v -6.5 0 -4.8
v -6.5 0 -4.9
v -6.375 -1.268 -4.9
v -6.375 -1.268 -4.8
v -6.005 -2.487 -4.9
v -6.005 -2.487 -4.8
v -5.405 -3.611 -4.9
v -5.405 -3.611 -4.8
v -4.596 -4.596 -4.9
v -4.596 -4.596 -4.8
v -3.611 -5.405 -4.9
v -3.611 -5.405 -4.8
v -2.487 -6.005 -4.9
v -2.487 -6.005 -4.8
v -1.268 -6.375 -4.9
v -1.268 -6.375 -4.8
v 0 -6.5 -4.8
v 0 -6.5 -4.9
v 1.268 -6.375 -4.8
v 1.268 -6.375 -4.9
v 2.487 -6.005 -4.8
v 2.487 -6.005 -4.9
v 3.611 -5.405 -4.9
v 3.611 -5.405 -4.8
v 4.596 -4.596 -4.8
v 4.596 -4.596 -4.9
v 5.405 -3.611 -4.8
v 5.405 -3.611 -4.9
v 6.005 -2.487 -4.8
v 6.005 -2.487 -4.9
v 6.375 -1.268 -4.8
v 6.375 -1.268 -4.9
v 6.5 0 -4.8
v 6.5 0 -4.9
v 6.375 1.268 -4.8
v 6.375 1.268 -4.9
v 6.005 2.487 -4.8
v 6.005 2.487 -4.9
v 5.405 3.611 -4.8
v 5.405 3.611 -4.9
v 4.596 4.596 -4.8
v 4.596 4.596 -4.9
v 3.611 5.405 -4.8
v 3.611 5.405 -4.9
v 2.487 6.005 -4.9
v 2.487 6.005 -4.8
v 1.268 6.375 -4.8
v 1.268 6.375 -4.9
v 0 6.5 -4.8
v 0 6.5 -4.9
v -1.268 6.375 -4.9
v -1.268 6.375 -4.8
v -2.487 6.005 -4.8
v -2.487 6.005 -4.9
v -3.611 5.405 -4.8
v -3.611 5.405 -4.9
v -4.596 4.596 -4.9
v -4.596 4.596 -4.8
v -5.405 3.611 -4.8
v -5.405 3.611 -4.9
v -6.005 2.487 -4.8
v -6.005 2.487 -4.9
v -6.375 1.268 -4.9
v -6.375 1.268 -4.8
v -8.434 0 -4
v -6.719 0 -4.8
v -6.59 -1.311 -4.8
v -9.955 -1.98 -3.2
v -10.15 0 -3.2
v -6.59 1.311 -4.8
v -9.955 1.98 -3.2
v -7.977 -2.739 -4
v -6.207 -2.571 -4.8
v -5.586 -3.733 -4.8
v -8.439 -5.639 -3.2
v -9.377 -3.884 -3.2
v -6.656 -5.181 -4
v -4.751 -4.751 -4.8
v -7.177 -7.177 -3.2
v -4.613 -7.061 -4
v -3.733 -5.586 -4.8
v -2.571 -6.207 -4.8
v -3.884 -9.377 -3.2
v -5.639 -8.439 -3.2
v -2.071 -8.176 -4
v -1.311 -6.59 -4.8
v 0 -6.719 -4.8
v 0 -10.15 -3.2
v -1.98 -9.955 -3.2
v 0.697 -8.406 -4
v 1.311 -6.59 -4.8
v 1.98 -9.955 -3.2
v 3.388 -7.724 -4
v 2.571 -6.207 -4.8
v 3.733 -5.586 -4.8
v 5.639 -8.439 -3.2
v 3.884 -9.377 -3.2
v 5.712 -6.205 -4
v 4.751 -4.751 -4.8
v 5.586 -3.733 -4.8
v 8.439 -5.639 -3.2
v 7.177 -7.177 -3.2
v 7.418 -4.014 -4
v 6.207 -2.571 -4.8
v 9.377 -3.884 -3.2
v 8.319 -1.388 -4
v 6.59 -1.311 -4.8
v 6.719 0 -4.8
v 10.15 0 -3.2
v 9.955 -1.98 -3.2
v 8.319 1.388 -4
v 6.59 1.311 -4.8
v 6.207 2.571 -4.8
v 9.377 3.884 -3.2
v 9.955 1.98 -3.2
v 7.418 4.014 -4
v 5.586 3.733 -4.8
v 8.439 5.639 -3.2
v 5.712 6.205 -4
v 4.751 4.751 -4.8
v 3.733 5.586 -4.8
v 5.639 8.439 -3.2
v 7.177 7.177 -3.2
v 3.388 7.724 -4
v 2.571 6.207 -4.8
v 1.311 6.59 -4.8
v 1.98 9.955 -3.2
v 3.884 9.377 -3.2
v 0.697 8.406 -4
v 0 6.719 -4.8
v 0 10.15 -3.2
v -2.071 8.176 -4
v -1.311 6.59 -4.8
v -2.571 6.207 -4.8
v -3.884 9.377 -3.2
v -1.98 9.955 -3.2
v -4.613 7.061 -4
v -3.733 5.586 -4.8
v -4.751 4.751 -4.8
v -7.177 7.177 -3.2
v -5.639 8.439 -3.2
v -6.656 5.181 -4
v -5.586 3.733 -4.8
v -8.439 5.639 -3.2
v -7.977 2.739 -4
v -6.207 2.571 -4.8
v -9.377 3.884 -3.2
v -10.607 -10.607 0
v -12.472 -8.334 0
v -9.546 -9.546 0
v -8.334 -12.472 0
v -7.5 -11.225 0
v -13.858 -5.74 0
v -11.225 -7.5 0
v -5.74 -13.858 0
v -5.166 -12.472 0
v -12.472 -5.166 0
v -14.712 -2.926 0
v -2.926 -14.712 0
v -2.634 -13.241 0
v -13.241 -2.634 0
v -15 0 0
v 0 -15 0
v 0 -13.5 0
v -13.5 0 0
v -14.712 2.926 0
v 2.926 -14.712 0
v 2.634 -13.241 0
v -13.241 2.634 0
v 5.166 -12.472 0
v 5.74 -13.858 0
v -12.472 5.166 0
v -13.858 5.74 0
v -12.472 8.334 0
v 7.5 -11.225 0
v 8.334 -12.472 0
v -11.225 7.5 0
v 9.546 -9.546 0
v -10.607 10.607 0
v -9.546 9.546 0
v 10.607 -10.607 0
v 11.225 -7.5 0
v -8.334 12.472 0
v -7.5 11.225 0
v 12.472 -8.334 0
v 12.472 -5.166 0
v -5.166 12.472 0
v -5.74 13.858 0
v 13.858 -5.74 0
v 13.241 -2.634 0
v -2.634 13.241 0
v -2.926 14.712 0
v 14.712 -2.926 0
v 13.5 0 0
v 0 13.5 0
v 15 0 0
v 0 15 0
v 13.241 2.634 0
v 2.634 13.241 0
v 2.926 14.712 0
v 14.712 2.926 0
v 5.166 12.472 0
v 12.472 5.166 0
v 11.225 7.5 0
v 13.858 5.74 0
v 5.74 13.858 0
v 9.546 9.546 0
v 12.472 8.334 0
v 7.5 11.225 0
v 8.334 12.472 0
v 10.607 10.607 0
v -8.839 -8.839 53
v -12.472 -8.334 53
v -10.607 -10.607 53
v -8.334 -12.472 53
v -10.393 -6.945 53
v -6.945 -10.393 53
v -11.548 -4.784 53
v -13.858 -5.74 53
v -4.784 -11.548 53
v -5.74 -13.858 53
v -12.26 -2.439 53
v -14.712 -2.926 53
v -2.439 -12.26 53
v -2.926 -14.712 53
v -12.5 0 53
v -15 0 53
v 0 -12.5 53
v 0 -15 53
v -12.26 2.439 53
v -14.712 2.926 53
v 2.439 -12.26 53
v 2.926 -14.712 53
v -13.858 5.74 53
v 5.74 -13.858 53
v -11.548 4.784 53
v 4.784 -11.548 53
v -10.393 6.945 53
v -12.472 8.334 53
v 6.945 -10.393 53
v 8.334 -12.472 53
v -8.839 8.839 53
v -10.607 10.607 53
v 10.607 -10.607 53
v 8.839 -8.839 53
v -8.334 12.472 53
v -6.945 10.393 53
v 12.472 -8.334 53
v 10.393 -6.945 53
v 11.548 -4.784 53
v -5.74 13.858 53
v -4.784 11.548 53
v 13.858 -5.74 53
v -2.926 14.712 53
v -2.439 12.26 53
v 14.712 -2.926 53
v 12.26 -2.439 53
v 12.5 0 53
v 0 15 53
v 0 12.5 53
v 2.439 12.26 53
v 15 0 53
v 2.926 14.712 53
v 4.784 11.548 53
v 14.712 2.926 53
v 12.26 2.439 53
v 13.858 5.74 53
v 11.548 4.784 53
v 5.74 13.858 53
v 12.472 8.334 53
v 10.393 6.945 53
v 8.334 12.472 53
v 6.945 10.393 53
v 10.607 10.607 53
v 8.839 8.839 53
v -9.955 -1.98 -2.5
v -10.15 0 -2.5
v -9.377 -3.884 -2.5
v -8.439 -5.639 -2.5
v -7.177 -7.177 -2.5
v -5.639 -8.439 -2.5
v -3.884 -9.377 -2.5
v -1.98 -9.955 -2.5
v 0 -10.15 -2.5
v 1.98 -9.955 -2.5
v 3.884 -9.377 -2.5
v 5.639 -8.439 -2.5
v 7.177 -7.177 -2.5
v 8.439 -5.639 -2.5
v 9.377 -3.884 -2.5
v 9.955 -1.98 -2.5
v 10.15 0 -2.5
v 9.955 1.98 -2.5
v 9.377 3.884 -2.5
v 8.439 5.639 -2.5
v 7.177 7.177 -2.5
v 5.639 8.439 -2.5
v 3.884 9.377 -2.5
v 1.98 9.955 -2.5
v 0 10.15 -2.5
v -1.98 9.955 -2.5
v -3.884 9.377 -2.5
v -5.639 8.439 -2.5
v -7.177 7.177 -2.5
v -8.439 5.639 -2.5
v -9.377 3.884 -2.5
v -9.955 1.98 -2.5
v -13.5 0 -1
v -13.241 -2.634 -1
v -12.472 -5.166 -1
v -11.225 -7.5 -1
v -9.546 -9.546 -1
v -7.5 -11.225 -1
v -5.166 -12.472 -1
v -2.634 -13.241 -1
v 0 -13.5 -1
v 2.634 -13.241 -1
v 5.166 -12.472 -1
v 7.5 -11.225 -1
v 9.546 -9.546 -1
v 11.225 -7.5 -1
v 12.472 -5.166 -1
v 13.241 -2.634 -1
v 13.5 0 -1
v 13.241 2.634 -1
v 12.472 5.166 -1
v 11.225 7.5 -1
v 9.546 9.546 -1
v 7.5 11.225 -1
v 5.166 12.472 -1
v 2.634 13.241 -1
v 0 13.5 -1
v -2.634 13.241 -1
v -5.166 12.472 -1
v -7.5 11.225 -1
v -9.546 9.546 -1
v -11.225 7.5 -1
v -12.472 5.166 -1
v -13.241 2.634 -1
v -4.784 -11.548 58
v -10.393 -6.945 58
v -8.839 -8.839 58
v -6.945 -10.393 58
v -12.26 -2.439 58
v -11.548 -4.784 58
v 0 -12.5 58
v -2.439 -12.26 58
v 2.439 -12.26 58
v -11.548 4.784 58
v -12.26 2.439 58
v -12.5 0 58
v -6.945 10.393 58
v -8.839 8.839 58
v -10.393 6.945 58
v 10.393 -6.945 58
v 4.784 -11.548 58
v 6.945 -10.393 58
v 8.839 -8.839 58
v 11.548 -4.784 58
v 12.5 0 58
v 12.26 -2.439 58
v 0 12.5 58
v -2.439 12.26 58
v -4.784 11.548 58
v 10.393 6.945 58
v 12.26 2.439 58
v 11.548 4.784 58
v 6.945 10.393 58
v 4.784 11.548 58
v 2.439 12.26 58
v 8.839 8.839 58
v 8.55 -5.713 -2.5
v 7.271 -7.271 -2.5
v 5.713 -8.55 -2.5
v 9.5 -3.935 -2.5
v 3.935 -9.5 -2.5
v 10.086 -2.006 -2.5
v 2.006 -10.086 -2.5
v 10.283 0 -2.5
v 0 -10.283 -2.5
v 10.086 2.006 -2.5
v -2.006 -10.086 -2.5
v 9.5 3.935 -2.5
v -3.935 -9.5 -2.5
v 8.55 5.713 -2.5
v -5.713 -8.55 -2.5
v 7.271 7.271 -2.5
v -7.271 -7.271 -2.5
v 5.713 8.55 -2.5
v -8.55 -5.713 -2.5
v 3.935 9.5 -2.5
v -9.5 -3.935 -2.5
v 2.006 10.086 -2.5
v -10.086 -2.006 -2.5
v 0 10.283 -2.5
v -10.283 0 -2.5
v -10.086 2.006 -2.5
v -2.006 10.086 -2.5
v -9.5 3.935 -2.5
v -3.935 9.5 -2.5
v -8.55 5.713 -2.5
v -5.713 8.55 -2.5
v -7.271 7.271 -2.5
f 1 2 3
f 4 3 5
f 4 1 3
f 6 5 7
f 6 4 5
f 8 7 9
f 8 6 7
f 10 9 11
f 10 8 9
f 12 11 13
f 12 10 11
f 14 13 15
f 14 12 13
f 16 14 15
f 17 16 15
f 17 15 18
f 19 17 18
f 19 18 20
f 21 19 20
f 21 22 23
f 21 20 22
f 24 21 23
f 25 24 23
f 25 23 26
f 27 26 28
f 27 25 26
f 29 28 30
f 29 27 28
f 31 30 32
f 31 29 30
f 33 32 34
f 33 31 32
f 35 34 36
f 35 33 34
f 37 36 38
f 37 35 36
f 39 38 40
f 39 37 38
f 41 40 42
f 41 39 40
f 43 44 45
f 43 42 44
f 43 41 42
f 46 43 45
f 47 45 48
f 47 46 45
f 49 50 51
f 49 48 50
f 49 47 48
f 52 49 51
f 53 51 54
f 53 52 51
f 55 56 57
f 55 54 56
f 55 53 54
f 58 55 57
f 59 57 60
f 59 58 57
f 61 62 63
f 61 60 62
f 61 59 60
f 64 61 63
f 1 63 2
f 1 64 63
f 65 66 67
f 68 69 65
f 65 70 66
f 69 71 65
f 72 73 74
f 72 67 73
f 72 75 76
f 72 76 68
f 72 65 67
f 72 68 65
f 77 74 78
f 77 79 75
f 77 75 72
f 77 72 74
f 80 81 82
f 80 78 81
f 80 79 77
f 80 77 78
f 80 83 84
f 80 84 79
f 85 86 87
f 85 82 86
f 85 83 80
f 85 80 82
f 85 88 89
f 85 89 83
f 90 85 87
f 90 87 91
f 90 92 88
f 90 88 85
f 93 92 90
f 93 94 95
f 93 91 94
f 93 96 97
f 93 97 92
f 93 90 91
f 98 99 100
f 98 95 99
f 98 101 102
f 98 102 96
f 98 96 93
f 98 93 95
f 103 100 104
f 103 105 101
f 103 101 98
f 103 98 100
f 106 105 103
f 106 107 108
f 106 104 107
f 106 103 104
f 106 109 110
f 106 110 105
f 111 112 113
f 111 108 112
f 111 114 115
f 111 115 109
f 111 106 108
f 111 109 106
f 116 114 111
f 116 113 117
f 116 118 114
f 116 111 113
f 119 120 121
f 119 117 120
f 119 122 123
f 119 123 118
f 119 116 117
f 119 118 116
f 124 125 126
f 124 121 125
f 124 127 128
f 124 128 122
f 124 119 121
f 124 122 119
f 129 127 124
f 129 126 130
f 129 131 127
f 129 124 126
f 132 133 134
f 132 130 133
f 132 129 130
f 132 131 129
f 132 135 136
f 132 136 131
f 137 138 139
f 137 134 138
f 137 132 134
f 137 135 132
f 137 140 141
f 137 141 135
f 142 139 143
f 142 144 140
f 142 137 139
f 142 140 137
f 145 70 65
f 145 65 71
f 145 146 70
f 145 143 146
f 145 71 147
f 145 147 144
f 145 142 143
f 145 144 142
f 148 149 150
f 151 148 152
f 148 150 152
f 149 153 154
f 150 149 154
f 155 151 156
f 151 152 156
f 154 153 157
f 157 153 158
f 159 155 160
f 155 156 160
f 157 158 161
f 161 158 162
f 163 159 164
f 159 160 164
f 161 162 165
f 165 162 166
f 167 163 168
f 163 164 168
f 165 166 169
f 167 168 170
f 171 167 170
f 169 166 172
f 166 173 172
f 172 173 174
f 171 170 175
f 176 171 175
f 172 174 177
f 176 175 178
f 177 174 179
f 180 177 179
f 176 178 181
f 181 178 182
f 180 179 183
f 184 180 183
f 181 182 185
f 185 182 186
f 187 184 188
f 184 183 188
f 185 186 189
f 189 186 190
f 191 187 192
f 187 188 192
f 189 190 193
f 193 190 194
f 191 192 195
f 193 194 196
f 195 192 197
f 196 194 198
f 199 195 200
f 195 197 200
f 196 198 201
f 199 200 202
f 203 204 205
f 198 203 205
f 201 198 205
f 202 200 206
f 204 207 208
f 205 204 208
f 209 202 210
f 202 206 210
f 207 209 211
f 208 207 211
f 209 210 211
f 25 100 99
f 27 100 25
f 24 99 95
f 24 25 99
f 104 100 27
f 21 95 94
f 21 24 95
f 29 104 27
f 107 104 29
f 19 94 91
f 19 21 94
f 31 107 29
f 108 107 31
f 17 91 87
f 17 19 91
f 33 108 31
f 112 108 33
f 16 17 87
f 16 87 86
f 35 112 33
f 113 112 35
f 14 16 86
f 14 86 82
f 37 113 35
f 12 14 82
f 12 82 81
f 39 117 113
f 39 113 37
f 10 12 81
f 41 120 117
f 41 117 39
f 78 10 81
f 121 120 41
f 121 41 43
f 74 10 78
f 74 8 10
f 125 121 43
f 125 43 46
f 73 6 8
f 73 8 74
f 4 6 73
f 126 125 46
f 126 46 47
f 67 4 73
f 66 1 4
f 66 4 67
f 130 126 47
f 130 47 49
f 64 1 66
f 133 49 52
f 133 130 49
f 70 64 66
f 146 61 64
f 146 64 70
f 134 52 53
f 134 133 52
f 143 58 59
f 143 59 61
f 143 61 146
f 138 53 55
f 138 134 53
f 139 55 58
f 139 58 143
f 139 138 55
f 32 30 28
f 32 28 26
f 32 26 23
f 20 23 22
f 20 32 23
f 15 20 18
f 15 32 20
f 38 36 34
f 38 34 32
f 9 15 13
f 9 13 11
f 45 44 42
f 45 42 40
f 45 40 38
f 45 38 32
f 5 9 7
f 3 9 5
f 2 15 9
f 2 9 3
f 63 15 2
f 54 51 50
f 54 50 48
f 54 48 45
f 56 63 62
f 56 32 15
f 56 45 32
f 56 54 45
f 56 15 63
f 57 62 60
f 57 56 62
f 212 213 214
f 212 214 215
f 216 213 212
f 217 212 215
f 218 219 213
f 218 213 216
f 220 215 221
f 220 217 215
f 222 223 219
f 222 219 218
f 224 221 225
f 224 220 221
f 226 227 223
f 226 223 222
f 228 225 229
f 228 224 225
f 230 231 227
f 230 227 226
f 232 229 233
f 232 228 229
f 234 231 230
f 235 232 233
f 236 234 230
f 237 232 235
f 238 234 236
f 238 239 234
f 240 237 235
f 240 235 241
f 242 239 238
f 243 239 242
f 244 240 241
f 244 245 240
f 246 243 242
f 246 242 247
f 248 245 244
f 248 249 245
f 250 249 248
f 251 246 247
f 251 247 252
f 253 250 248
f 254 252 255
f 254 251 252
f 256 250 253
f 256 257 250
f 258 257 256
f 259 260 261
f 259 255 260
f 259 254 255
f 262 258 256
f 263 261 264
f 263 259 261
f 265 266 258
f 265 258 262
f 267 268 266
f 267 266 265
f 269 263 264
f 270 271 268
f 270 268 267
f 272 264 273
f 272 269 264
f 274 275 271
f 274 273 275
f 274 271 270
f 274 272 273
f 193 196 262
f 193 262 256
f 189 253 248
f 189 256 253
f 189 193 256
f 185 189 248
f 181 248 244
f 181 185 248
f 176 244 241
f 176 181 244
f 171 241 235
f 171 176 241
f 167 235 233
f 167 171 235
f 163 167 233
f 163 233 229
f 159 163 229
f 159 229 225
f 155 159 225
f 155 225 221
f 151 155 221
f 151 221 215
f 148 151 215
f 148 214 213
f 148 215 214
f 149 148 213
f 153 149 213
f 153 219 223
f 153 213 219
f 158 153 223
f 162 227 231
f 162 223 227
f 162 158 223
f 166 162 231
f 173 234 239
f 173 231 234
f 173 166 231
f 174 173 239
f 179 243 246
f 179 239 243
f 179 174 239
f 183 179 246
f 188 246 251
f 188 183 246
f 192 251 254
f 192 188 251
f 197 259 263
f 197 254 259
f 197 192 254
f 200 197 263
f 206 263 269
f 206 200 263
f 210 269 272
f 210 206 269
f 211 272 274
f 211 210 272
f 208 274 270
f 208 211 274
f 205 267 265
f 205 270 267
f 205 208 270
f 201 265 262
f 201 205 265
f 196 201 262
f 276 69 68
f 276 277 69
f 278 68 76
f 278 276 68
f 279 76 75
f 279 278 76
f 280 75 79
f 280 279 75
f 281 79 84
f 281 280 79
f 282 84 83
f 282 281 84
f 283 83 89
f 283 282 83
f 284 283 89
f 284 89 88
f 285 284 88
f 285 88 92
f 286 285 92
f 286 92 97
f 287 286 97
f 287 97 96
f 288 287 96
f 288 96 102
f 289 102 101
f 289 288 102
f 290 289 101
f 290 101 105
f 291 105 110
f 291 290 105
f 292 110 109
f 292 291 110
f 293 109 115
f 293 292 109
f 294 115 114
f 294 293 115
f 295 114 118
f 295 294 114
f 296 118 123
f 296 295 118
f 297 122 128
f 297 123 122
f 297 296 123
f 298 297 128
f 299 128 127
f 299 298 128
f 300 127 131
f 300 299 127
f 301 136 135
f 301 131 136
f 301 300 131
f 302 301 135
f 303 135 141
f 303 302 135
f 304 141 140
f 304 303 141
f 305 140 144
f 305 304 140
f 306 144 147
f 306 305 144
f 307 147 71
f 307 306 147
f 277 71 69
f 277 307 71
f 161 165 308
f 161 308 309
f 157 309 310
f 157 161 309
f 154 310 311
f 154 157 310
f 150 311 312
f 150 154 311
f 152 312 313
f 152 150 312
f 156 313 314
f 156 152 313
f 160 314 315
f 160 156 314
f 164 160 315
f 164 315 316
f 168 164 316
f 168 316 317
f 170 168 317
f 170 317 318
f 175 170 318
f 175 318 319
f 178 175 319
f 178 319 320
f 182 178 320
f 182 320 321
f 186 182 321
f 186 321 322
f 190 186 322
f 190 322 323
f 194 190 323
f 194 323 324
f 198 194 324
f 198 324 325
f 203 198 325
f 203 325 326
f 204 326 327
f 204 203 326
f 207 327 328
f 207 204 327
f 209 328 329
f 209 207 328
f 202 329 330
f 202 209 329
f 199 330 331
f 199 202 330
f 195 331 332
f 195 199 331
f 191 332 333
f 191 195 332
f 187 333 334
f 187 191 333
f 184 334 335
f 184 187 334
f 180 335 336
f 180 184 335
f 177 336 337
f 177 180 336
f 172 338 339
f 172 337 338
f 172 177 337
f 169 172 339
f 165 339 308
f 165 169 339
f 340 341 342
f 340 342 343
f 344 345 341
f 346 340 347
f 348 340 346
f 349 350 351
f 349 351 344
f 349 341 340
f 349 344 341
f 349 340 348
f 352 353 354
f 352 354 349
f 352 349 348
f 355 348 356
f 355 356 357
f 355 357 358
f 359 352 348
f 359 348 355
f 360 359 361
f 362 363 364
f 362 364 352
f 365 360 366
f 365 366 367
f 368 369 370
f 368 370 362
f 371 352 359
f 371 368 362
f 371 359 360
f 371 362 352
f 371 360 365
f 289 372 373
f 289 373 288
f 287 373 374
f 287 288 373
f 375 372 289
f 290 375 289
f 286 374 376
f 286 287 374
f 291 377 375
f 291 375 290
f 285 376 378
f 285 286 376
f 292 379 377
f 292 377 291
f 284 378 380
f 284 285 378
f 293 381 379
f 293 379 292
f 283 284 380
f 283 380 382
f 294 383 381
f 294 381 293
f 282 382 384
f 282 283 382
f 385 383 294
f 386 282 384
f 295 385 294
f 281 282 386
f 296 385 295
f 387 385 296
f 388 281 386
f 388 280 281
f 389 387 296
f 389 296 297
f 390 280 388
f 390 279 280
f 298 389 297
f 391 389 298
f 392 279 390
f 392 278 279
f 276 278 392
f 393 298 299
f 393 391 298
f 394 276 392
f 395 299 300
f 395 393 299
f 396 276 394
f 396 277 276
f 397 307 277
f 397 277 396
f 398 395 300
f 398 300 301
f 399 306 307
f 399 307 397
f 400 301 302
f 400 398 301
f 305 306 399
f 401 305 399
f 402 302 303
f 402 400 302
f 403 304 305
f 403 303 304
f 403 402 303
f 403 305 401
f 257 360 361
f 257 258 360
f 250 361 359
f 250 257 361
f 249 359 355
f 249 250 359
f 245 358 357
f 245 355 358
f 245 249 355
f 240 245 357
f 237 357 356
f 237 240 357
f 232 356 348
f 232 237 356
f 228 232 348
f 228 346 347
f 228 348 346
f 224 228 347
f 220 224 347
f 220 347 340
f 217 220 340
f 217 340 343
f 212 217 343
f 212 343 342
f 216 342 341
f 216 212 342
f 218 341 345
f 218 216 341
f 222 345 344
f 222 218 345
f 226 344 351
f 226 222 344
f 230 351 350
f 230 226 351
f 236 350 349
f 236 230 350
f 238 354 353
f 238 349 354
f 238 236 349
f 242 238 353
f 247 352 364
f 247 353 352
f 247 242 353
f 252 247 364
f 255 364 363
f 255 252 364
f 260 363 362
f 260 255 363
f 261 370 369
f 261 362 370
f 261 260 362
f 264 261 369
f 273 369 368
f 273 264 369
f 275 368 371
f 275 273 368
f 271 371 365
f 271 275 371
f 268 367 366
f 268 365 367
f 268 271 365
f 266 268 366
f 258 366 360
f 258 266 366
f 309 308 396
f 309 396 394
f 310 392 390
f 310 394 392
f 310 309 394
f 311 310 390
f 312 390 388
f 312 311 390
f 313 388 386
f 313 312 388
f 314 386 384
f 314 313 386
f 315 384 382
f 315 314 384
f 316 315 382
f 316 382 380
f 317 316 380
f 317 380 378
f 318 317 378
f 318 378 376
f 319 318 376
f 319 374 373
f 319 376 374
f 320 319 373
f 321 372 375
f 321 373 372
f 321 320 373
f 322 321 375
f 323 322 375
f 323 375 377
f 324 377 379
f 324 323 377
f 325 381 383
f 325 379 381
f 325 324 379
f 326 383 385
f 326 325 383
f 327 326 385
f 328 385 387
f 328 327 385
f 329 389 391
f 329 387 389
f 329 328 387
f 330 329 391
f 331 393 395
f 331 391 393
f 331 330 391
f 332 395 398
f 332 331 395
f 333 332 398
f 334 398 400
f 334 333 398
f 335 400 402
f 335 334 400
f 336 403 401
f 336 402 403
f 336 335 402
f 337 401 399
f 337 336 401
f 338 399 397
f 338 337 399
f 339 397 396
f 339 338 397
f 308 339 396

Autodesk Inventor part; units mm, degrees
ref_plane "YZ Plane" through (0, 0, 0) normal (1, 0, 0) x (0, 1, 0)
ref_plane "XZ Plane" through (0, 0, 0) normal (0, 1, 0) x (-1, 0, 0)
ref_plane "XY Plane" through (0, 0, 0) normal (0, 0, 1) x (1, 0, 0)
sketch "Sketch1" plane through (0, 0, 0) normal (0, 0, 1) x (1, 0, 0)
  circle A0 centre (0, 0) radius 15
  dimension "d0" = 30
extrude "Extrusion1" add sketch "Sketch1" along normal blind 53
sketch "Sketch2" plane through (0, 0, 53) normal (0, 0, 1) x (1, 0, 0)
  circle A0 centre (0, 0) radius 12.5
  dimension "d3" = 25
extrude "Extrusion2" add sketch "Sketch2" along normal blind 5
thread "Thread1" size "M25x1" class "6g" standard "ANSI Metric M Profile" length 25.006
sketch "Sketch3" plane through (0, 0, 0) normal (0, 0, -1) x (-1, 0, 0)
  circle A0 centre (0, 0) radius 6.5
  dimension "d8" = 13
extrude "Extrusion3" add sketch "Sketch3" along normal blind 4.9
sketch "Sketch4" plane through (0, 0, 0) normal (0, 0, -1) x (-1, 0, 0)
  circle A0 centre (0, 0) radius 13.5
  dimension "d11" = 27
extrude "Extrusion4" add sketch "Sketch4" along normal blind 2.5
sketch "Sketch5" plane through (0, 0, -2.5) normal (0, 0, -1) x (-1, 0, 0)
  circle A0 centre (0, 0) radius 10.15
  dimension "d14" = 20.3
extrude "Extrusion5" add sketch "Sketch5" along normal blind 2.3
chamfer "Chamfer1" distance 1.5 angle 65 1 edges at (13.5, 0, -2.5) measured on face at (-13.3252, -2.1656, -1.6667)
chamfer "Chamfer2" distance 1.6 angle 65 1 edges at (10.15, 0, -4.8) measured on face at (-10.1171, -0.8167, -4.0333)
ref_plane "Work Plane1" through (0, 0, -6.9) normal (0, 0, -1) x (-1, 0, 0)
sketch "Sketch6" plane through (0, 0, 58) normal (0, 0, 1) x (1, 0, 0)
  circle A0 centre (0, 0) radius 10
  dimension "d24" = 20
extrude "Extrusion6" cut sketch "Sketch6" against normal blind 58
sketch "Sketch7" plane through (0, 0, 0) normal (0, 0, 1) x (1, 0, 0)
  circle A0 centre (0, 0) radius 8
  dimension "d27" = 16
extrude "Extrusion7" cut sketch "Sketch7" against normal blind 2
thicken "Thicken1" operation add thickness 58 both sides no extend neighbours no toward (0, 0, 1) faces at (9.159, -1.4359, 0)
thicken "Thicken2" operation add thickness 60 both sides no extend neighbours no toward (0, 0, 1) faces at (0.9456, 2.4934, -2)
properties part number "Nikon-Objektive-MUC11900_Mockup" material "Stainless Steel"
